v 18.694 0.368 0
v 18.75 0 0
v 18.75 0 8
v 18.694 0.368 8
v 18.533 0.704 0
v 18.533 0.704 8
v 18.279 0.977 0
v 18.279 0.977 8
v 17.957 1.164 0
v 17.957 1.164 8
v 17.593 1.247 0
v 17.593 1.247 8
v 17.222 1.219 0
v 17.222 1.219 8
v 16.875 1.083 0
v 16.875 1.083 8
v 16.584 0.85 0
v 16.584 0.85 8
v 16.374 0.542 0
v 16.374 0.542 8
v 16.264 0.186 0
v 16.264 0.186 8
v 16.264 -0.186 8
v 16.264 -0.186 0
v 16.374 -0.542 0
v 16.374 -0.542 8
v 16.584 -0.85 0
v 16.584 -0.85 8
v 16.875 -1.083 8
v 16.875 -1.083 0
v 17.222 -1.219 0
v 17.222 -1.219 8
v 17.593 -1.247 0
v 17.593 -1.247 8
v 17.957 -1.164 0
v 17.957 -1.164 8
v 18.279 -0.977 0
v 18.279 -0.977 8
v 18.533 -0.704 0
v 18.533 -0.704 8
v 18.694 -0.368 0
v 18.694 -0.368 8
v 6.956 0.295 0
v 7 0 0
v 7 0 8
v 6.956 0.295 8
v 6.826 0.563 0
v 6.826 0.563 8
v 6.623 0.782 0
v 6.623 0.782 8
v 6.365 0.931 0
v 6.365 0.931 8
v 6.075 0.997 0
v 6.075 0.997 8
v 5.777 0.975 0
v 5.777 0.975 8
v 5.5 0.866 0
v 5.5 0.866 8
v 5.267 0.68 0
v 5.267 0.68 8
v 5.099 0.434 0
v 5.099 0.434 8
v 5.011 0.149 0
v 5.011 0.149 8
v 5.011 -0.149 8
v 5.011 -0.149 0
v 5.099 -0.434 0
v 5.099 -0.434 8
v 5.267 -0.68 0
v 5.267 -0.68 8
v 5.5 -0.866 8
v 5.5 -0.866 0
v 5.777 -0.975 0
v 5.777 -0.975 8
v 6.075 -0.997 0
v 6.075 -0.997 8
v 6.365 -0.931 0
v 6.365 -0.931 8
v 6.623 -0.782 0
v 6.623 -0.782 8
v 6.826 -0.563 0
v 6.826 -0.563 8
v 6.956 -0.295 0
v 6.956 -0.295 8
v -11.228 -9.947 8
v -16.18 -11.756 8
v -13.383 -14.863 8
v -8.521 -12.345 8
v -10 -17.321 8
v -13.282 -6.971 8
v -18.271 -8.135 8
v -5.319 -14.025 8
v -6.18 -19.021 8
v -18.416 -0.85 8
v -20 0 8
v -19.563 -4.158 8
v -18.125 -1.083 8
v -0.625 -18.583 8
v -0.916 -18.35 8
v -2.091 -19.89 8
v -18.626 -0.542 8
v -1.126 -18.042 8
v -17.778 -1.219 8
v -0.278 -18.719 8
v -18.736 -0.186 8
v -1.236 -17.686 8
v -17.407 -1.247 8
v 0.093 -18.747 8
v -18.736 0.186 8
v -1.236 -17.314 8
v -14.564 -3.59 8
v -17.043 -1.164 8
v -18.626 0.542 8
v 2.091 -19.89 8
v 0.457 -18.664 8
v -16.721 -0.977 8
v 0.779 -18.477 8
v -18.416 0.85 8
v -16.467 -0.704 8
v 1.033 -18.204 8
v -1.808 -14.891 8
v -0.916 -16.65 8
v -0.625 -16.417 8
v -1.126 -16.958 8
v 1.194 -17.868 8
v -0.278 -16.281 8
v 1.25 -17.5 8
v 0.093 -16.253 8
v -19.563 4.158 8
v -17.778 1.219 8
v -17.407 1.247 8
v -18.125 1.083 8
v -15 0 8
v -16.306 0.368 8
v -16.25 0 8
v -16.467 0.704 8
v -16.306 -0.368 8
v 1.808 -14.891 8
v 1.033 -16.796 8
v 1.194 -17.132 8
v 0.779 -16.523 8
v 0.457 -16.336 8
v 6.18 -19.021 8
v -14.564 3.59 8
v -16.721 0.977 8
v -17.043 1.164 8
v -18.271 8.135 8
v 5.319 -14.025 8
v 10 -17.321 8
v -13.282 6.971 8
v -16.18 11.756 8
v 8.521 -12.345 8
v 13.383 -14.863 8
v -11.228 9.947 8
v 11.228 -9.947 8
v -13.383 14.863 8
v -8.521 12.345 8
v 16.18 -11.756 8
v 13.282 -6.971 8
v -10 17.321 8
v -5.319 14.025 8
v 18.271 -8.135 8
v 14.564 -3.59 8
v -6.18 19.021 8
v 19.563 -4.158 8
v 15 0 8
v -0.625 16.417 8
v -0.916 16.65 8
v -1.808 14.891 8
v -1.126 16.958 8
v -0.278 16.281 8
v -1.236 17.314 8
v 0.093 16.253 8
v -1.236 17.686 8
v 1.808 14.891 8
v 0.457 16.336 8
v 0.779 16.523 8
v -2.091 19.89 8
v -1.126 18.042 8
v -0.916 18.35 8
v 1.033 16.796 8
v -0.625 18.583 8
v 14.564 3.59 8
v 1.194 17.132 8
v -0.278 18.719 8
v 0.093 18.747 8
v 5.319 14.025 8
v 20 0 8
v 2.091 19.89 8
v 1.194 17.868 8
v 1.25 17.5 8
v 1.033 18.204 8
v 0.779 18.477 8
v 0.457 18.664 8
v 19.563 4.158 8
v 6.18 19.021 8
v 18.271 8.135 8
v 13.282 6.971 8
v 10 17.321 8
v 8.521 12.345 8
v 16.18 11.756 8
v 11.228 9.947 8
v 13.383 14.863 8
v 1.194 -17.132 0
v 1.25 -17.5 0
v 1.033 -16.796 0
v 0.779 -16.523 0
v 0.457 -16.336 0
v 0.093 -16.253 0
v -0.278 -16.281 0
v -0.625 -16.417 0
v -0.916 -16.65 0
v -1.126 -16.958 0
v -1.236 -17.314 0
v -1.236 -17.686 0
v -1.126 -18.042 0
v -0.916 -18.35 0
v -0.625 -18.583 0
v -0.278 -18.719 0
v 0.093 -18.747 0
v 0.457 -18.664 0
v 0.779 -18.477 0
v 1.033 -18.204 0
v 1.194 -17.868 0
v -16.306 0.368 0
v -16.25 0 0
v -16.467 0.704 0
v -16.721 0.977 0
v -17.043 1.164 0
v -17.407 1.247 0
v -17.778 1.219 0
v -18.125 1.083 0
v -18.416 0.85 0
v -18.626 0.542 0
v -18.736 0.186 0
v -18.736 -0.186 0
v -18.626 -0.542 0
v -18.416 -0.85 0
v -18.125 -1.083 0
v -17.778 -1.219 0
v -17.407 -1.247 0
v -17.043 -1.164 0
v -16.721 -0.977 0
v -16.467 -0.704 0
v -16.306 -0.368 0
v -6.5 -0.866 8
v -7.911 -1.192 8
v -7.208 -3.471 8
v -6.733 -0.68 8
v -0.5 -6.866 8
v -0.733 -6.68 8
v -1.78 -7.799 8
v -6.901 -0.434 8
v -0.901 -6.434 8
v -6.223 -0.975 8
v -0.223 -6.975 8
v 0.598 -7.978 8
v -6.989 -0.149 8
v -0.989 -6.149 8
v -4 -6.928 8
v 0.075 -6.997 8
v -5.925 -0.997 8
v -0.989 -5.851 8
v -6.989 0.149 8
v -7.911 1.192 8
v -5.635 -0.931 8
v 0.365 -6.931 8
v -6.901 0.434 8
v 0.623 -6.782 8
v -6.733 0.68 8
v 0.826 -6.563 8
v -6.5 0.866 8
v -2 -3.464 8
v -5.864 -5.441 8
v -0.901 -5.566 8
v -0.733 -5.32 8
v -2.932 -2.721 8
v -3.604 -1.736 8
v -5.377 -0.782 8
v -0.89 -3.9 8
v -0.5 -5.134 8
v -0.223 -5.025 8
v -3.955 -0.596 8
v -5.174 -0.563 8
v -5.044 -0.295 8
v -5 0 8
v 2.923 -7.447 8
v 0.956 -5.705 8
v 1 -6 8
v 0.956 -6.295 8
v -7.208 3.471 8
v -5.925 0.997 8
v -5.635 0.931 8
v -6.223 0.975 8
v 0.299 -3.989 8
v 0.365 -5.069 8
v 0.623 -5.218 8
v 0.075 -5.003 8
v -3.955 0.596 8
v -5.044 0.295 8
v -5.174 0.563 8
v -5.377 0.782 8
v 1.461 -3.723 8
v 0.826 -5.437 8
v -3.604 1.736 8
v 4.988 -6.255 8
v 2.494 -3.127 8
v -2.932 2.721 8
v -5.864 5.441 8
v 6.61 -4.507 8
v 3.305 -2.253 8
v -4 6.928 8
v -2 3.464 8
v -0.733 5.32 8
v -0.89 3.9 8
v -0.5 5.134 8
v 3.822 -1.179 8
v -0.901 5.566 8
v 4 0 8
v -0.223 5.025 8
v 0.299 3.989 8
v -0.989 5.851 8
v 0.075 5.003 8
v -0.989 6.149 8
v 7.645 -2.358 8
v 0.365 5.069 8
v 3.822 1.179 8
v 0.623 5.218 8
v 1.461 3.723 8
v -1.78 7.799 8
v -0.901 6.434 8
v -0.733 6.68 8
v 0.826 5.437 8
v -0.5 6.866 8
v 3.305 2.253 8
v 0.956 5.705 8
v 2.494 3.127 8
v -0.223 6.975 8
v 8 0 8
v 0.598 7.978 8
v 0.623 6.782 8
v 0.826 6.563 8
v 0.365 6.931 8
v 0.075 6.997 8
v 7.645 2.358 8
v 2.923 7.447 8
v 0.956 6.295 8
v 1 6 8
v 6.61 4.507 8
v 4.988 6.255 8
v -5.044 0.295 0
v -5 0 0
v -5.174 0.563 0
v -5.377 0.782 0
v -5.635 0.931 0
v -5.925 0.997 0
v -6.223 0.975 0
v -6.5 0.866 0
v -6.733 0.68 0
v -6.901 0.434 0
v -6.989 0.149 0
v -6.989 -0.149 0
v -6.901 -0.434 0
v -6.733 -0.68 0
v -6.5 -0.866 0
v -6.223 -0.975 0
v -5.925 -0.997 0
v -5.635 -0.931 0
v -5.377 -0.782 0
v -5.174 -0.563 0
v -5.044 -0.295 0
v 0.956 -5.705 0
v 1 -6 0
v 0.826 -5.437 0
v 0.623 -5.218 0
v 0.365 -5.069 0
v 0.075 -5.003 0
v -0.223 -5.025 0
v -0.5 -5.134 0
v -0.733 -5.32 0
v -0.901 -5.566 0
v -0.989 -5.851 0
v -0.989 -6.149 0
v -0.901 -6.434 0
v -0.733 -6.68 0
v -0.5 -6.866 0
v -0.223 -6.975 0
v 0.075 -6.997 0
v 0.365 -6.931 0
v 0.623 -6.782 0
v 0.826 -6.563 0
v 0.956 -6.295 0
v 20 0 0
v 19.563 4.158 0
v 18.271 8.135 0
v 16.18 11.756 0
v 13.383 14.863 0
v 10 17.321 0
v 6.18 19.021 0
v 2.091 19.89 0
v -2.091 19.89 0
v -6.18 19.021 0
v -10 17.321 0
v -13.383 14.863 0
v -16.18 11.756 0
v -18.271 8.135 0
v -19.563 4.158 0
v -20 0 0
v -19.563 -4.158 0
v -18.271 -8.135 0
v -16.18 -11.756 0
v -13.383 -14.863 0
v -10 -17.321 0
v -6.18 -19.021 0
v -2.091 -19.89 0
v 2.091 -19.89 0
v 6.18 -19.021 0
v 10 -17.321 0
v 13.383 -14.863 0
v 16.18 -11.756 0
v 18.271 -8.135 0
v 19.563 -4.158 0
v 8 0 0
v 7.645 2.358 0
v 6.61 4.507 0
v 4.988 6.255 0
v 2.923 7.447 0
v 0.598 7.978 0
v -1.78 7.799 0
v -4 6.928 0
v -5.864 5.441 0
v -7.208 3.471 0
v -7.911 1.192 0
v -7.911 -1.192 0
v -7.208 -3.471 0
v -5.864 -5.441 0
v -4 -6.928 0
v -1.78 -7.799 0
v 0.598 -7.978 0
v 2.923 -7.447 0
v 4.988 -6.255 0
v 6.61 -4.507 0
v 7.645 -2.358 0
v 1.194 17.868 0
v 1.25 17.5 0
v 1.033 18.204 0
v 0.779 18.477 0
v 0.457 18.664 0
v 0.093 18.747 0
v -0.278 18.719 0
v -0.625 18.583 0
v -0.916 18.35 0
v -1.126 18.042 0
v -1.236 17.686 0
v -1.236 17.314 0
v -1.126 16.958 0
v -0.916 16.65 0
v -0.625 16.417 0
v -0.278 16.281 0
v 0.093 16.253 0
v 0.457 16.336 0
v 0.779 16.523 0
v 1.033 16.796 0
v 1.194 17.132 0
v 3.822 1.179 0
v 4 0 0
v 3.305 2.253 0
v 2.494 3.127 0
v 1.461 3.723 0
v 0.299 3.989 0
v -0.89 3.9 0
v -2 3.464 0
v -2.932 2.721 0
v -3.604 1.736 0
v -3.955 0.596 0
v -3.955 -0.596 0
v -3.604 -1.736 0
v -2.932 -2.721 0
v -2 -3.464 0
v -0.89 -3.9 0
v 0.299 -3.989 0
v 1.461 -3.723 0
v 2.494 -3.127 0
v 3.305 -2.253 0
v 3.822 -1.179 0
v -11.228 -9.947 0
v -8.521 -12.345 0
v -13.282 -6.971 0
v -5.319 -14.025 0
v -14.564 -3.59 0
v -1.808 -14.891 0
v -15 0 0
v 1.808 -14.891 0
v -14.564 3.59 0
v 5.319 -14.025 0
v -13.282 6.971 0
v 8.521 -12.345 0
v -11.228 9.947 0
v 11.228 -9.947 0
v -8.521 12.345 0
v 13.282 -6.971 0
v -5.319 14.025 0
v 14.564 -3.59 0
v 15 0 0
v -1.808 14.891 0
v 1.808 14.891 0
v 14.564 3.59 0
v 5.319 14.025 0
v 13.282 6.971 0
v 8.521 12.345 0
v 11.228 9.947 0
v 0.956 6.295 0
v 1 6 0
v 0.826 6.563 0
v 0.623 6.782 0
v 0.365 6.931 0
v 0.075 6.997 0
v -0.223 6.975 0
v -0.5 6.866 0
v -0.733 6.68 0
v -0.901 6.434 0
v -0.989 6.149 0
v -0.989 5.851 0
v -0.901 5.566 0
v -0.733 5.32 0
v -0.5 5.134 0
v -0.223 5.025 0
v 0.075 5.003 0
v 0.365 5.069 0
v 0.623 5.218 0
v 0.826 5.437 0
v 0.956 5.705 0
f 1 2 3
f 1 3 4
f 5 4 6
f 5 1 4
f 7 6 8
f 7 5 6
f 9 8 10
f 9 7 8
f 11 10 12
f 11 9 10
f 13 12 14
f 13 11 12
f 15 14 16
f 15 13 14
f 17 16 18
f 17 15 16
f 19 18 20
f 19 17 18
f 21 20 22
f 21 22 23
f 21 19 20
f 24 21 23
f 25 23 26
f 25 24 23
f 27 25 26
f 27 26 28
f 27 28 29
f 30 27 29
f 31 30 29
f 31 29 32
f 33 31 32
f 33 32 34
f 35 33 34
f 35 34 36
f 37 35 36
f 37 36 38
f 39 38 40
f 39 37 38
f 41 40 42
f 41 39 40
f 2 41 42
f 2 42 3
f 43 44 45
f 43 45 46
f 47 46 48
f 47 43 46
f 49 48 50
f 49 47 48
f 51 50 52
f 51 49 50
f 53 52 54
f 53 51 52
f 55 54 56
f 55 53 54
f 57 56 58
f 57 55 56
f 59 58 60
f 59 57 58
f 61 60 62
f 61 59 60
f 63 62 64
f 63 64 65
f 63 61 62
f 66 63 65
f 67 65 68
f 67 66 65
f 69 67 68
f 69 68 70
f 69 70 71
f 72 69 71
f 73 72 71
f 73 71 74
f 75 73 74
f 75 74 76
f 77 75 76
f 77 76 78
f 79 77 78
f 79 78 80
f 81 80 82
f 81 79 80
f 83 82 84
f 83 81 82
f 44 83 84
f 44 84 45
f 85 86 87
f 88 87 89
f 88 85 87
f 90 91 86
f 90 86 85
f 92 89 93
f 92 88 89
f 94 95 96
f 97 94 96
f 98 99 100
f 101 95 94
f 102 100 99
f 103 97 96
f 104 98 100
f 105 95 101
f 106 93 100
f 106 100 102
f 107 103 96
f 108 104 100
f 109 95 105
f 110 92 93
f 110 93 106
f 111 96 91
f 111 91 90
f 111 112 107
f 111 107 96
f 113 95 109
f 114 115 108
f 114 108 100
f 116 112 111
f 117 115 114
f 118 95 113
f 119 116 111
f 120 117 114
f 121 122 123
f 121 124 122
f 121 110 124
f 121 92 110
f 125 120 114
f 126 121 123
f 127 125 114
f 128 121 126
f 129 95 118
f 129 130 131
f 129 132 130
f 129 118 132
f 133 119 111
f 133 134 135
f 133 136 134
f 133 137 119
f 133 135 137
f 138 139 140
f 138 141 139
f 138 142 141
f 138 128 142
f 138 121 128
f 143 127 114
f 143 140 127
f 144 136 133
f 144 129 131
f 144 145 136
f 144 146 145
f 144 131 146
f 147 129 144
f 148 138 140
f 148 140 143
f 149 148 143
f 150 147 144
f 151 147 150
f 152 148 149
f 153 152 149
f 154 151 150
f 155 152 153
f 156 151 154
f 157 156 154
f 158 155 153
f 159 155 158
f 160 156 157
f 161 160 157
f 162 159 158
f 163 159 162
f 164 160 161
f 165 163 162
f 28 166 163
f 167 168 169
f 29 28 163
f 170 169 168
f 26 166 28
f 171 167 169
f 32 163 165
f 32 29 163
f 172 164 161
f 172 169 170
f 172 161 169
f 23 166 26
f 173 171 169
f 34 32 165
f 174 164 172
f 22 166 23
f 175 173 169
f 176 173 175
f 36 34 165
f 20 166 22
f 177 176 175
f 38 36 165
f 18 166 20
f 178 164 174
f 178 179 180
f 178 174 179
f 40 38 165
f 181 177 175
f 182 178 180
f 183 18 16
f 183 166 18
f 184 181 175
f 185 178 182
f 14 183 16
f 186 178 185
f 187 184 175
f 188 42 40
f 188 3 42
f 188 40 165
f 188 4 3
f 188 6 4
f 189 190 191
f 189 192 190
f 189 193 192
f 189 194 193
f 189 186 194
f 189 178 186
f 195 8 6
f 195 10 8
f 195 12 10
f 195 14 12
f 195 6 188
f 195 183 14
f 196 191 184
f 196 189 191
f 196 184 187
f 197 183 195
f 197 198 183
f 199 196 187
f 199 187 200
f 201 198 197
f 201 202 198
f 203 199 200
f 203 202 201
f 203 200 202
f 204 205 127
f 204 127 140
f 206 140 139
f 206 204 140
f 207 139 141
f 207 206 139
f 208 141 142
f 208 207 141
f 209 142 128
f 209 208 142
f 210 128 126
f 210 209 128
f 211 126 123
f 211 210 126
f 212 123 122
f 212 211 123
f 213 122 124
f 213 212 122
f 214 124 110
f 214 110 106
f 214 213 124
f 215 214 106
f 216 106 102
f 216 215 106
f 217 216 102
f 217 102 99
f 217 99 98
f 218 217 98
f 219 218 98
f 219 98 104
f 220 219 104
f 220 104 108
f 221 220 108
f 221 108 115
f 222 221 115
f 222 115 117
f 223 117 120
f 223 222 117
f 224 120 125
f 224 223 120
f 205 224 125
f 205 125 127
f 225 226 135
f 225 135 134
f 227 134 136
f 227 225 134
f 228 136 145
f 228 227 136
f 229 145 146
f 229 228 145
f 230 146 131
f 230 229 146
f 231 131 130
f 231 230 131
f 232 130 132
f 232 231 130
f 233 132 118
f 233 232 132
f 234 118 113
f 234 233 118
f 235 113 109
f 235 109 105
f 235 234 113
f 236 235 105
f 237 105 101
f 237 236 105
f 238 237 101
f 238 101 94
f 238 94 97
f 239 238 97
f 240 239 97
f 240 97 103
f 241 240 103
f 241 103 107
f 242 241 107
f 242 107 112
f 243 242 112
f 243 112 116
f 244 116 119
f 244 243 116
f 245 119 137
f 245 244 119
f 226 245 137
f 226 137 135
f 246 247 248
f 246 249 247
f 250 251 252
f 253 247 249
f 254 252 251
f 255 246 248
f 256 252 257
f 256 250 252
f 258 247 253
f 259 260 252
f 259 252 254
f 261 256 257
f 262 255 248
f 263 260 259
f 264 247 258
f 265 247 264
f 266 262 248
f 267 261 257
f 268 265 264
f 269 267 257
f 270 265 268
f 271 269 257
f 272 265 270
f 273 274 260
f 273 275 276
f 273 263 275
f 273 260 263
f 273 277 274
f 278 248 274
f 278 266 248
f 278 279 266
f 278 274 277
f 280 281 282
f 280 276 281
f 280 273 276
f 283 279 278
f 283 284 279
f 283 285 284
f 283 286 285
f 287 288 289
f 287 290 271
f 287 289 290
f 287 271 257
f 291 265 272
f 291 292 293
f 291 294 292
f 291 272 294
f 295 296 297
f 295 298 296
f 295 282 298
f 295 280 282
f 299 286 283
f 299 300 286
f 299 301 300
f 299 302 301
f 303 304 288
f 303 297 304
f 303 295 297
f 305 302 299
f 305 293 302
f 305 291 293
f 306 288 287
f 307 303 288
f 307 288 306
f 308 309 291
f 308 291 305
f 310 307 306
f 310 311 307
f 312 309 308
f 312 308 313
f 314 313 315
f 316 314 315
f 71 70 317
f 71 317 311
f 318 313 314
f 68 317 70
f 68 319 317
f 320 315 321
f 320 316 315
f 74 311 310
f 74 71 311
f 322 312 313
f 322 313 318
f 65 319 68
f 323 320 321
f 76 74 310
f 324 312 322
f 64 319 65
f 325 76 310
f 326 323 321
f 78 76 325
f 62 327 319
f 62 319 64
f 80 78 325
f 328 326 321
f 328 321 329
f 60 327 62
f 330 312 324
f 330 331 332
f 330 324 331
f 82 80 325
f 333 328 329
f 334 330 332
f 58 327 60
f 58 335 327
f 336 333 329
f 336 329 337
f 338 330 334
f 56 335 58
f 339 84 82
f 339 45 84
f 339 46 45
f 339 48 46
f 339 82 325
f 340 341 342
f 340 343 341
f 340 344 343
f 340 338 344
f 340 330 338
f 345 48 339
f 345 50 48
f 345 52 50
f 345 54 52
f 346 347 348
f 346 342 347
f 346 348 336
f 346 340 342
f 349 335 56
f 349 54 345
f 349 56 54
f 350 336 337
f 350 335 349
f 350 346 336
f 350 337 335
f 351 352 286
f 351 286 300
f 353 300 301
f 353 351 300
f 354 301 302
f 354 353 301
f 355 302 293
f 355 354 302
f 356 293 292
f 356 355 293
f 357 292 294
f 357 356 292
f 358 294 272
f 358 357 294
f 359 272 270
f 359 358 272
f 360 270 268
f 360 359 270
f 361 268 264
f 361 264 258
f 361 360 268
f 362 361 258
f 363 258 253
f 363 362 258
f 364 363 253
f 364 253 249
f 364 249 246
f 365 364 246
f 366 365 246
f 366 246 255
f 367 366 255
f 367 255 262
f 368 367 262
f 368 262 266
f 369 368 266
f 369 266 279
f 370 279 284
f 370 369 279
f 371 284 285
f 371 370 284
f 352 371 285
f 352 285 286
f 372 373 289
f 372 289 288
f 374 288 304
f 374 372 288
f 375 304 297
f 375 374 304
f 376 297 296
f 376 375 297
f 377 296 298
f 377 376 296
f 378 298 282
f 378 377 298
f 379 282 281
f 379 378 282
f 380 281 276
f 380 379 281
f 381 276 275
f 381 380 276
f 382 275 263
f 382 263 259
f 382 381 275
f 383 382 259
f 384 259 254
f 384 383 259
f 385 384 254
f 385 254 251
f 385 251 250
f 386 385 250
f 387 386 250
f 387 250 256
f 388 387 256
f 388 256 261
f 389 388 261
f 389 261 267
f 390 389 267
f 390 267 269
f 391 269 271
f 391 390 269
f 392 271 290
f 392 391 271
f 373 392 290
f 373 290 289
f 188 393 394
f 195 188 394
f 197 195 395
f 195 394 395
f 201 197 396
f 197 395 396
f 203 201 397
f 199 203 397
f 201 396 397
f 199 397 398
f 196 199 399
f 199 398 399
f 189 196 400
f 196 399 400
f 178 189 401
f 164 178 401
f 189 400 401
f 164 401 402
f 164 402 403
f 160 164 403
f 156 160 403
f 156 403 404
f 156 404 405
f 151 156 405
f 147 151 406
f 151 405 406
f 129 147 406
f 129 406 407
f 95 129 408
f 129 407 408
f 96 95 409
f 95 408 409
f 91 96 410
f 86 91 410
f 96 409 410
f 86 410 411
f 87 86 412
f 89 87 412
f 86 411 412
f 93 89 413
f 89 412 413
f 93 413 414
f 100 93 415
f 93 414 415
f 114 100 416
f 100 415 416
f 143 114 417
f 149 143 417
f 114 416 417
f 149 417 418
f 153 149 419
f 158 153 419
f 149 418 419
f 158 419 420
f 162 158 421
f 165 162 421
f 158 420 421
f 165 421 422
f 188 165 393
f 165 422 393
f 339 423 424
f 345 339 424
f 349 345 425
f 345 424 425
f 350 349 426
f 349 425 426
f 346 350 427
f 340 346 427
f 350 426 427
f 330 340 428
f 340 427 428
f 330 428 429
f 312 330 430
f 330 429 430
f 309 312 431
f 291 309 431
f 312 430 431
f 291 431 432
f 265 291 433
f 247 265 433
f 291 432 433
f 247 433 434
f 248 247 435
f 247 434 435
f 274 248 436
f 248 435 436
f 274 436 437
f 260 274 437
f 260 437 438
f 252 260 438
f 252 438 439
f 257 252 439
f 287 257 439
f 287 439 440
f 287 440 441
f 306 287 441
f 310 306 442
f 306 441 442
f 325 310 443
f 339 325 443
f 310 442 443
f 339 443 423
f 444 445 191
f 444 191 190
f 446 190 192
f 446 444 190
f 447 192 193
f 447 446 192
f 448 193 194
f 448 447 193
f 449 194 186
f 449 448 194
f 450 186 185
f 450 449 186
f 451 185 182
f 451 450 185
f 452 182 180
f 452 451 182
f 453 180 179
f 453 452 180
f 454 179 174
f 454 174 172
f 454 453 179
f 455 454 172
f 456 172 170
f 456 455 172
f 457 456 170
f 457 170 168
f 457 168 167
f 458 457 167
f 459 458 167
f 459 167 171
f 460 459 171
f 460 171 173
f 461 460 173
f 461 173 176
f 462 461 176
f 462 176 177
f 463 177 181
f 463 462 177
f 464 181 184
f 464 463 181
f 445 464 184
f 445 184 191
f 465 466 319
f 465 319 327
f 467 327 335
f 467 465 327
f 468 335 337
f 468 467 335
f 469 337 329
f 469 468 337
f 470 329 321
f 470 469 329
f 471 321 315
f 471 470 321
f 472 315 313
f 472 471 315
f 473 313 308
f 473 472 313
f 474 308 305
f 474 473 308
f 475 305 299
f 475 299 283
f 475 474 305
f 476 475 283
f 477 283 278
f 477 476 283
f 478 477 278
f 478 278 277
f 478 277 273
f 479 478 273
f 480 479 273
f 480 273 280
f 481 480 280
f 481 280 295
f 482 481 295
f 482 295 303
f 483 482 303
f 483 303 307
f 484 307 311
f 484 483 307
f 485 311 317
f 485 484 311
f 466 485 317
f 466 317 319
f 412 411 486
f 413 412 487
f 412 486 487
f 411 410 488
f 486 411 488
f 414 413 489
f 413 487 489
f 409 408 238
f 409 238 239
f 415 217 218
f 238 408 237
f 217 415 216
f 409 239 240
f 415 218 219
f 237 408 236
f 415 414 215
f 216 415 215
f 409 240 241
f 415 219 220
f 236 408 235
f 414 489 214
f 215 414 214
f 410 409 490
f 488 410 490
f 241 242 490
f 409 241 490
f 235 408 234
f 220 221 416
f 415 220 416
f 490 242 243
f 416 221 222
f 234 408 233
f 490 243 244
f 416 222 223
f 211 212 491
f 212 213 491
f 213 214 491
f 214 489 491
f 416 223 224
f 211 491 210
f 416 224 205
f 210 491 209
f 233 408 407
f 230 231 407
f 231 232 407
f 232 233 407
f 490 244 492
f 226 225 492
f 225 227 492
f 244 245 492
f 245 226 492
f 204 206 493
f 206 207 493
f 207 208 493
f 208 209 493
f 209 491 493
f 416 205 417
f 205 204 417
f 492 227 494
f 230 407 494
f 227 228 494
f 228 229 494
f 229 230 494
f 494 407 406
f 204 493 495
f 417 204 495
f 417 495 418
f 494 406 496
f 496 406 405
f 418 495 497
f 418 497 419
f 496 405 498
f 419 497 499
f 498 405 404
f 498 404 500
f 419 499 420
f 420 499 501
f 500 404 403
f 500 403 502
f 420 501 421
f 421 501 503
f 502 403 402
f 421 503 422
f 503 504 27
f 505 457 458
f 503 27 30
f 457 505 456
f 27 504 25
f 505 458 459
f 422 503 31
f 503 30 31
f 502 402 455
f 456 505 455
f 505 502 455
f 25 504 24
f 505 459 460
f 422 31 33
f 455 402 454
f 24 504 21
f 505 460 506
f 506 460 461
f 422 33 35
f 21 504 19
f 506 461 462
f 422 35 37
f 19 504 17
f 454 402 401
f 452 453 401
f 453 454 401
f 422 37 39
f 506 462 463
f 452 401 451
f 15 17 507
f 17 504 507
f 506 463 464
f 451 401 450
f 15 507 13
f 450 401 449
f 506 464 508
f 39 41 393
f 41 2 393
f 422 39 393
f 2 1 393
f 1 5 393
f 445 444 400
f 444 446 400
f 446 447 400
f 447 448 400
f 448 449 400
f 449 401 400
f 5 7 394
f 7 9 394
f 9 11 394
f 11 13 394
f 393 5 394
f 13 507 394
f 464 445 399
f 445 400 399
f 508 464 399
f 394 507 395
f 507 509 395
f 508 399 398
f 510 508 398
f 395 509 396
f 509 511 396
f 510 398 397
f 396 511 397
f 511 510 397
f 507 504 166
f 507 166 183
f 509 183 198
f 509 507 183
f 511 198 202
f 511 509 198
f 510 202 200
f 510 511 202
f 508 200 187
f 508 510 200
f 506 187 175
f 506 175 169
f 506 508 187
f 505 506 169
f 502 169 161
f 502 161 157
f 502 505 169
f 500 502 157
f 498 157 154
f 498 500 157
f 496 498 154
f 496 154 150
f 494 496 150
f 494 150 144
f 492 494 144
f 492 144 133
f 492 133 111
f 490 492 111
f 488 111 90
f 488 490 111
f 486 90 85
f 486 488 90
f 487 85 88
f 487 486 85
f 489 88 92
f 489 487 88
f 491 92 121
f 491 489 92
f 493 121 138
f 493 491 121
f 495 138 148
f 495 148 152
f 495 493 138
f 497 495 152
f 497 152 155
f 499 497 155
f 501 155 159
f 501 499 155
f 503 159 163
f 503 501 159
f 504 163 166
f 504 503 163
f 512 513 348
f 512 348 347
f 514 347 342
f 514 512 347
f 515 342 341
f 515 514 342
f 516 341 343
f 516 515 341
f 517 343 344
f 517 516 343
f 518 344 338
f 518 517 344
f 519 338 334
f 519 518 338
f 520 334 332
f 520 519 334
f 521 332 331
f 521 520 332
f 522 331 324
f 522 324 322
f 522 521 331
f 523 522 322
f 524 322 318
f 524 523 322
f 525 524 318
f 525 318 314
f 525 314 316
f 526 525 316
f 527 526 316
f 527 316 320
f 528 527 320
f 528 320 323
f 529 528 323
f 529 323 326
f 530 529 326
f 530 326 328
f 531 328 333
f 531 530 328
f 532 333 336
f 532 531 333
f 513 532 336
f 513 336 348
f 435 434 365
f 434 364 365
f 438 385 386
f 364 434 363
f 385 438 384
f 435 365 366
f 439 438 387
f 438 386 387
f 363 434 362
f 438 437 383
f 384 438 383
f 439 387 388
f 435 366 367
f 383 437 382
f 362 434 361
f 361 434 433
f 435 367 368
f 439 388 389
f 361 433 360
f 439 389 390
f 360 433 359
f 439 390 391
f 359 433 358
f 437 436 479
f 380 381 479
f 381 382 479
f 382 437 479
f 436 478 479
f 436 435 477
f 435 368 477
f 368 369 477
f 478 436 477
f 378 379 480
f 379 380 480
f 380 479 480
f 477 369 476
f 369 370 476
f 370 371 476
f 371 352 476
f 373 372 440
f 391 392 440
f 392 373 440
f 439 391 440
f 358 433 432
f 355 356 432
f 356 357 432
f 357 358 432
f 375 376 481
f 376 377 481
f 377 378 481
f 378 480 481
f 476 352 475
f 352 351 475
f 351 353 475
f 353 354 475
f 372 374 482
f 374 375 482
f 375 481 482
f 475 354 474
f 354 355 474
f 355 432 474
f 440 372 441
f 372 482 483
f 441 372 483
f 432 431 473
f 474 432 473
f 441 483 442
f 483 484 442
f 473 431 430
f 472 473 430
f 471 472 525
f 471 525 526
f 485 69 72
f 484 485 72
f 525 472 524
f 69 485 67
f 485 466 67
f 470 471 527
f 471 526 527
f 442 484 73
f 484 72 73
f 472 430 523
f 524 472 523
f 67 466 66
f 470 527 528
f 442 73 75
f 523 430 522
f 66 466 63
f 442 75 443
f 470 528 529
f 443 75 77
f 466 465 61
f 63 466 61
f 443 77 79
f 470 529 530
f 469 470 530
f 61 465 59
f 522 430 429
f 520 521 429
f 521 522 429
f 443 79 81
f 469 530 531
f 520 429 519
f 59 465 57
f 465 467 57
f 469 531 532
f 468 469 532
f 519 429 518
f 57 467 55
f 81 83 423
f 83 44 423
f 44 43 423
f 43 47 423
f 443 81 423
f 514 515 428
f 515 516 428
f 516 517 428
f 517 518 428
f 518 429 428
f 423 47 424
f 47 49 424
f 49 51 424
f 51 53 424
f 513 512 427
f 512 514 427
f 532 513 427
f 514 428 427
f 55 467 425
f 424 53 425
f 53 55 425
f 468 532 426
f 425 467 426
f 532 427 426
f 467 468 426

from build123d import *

# Parameters (mm, degrees)
SKETCH1_R             = 20
SKETCH1_R_2           = 1.25
SKETCH1_R_3           = 15
BOSS_EXTRUDE1_DEPTH   = 8
SKETCH1_R_4           = 8
SKETCH1_R_5           = 4
SKETCH1_R_6           = 1
BOSS_EXTRUDE1_2_DEPTH = 8


with BuildPart() as part:
    # Sketch1 → Boss-Extrude1 (new body)
    with BuildSketch(Plane.XY):
        Circle(SKETCH1_R)
        with Locations((0, 17.5)):
            Circle(SKETCH1_R_2, mode=Mode.SUBTRACT)
        with Locations((17.5, 0)):
            Circle(SKETCH1_R_2, mode=Mode.SUBTRACT)
        with Locations((0, -17.5)):
            Circle(SKETCH1_R_2, mode=Mode.SUBTRACT)
        with Locations((-17.5, 0)):
            Circle(SKETCH1_R_2, mode=Mode.SUBTRACT)
        Circle(SKETCH1_R_3, mode=Mode.SUBTRACT)
    extrude(amount=BOSS_EXTRUDE1_DEPTH)


with BuildPart() as body_2:
    # Sketch1 → Boss-Extrude1 2 (new body)
    with BuildSketch(Plane.XY):
        Circle(SKETCH1_R_4)
        Circle(SKETCH1_R_5, mode=Mode.SUBTRACT)
        with Locations((0, 6)):
            Circle(SKETCH1_R_6, mode=Mode.SUBTRACT)
        with Locations((6, 0)):
            Circle(SKETCH1_R_6, mode=Mode.SUBTRACT)
        with Locations((0, -6)):
            Circle(SKETCH1_R_6, mode=Mode.SUBTRACT)
        with Locations((-6, 0)):
            Circle(SKETCH1_R_6, mode=Mode.SUBTRACT)
    extrude(amount=BOSS_EXTRUDE1_2_DEPTH)


solid = Compound([part.part, body_2.part])
